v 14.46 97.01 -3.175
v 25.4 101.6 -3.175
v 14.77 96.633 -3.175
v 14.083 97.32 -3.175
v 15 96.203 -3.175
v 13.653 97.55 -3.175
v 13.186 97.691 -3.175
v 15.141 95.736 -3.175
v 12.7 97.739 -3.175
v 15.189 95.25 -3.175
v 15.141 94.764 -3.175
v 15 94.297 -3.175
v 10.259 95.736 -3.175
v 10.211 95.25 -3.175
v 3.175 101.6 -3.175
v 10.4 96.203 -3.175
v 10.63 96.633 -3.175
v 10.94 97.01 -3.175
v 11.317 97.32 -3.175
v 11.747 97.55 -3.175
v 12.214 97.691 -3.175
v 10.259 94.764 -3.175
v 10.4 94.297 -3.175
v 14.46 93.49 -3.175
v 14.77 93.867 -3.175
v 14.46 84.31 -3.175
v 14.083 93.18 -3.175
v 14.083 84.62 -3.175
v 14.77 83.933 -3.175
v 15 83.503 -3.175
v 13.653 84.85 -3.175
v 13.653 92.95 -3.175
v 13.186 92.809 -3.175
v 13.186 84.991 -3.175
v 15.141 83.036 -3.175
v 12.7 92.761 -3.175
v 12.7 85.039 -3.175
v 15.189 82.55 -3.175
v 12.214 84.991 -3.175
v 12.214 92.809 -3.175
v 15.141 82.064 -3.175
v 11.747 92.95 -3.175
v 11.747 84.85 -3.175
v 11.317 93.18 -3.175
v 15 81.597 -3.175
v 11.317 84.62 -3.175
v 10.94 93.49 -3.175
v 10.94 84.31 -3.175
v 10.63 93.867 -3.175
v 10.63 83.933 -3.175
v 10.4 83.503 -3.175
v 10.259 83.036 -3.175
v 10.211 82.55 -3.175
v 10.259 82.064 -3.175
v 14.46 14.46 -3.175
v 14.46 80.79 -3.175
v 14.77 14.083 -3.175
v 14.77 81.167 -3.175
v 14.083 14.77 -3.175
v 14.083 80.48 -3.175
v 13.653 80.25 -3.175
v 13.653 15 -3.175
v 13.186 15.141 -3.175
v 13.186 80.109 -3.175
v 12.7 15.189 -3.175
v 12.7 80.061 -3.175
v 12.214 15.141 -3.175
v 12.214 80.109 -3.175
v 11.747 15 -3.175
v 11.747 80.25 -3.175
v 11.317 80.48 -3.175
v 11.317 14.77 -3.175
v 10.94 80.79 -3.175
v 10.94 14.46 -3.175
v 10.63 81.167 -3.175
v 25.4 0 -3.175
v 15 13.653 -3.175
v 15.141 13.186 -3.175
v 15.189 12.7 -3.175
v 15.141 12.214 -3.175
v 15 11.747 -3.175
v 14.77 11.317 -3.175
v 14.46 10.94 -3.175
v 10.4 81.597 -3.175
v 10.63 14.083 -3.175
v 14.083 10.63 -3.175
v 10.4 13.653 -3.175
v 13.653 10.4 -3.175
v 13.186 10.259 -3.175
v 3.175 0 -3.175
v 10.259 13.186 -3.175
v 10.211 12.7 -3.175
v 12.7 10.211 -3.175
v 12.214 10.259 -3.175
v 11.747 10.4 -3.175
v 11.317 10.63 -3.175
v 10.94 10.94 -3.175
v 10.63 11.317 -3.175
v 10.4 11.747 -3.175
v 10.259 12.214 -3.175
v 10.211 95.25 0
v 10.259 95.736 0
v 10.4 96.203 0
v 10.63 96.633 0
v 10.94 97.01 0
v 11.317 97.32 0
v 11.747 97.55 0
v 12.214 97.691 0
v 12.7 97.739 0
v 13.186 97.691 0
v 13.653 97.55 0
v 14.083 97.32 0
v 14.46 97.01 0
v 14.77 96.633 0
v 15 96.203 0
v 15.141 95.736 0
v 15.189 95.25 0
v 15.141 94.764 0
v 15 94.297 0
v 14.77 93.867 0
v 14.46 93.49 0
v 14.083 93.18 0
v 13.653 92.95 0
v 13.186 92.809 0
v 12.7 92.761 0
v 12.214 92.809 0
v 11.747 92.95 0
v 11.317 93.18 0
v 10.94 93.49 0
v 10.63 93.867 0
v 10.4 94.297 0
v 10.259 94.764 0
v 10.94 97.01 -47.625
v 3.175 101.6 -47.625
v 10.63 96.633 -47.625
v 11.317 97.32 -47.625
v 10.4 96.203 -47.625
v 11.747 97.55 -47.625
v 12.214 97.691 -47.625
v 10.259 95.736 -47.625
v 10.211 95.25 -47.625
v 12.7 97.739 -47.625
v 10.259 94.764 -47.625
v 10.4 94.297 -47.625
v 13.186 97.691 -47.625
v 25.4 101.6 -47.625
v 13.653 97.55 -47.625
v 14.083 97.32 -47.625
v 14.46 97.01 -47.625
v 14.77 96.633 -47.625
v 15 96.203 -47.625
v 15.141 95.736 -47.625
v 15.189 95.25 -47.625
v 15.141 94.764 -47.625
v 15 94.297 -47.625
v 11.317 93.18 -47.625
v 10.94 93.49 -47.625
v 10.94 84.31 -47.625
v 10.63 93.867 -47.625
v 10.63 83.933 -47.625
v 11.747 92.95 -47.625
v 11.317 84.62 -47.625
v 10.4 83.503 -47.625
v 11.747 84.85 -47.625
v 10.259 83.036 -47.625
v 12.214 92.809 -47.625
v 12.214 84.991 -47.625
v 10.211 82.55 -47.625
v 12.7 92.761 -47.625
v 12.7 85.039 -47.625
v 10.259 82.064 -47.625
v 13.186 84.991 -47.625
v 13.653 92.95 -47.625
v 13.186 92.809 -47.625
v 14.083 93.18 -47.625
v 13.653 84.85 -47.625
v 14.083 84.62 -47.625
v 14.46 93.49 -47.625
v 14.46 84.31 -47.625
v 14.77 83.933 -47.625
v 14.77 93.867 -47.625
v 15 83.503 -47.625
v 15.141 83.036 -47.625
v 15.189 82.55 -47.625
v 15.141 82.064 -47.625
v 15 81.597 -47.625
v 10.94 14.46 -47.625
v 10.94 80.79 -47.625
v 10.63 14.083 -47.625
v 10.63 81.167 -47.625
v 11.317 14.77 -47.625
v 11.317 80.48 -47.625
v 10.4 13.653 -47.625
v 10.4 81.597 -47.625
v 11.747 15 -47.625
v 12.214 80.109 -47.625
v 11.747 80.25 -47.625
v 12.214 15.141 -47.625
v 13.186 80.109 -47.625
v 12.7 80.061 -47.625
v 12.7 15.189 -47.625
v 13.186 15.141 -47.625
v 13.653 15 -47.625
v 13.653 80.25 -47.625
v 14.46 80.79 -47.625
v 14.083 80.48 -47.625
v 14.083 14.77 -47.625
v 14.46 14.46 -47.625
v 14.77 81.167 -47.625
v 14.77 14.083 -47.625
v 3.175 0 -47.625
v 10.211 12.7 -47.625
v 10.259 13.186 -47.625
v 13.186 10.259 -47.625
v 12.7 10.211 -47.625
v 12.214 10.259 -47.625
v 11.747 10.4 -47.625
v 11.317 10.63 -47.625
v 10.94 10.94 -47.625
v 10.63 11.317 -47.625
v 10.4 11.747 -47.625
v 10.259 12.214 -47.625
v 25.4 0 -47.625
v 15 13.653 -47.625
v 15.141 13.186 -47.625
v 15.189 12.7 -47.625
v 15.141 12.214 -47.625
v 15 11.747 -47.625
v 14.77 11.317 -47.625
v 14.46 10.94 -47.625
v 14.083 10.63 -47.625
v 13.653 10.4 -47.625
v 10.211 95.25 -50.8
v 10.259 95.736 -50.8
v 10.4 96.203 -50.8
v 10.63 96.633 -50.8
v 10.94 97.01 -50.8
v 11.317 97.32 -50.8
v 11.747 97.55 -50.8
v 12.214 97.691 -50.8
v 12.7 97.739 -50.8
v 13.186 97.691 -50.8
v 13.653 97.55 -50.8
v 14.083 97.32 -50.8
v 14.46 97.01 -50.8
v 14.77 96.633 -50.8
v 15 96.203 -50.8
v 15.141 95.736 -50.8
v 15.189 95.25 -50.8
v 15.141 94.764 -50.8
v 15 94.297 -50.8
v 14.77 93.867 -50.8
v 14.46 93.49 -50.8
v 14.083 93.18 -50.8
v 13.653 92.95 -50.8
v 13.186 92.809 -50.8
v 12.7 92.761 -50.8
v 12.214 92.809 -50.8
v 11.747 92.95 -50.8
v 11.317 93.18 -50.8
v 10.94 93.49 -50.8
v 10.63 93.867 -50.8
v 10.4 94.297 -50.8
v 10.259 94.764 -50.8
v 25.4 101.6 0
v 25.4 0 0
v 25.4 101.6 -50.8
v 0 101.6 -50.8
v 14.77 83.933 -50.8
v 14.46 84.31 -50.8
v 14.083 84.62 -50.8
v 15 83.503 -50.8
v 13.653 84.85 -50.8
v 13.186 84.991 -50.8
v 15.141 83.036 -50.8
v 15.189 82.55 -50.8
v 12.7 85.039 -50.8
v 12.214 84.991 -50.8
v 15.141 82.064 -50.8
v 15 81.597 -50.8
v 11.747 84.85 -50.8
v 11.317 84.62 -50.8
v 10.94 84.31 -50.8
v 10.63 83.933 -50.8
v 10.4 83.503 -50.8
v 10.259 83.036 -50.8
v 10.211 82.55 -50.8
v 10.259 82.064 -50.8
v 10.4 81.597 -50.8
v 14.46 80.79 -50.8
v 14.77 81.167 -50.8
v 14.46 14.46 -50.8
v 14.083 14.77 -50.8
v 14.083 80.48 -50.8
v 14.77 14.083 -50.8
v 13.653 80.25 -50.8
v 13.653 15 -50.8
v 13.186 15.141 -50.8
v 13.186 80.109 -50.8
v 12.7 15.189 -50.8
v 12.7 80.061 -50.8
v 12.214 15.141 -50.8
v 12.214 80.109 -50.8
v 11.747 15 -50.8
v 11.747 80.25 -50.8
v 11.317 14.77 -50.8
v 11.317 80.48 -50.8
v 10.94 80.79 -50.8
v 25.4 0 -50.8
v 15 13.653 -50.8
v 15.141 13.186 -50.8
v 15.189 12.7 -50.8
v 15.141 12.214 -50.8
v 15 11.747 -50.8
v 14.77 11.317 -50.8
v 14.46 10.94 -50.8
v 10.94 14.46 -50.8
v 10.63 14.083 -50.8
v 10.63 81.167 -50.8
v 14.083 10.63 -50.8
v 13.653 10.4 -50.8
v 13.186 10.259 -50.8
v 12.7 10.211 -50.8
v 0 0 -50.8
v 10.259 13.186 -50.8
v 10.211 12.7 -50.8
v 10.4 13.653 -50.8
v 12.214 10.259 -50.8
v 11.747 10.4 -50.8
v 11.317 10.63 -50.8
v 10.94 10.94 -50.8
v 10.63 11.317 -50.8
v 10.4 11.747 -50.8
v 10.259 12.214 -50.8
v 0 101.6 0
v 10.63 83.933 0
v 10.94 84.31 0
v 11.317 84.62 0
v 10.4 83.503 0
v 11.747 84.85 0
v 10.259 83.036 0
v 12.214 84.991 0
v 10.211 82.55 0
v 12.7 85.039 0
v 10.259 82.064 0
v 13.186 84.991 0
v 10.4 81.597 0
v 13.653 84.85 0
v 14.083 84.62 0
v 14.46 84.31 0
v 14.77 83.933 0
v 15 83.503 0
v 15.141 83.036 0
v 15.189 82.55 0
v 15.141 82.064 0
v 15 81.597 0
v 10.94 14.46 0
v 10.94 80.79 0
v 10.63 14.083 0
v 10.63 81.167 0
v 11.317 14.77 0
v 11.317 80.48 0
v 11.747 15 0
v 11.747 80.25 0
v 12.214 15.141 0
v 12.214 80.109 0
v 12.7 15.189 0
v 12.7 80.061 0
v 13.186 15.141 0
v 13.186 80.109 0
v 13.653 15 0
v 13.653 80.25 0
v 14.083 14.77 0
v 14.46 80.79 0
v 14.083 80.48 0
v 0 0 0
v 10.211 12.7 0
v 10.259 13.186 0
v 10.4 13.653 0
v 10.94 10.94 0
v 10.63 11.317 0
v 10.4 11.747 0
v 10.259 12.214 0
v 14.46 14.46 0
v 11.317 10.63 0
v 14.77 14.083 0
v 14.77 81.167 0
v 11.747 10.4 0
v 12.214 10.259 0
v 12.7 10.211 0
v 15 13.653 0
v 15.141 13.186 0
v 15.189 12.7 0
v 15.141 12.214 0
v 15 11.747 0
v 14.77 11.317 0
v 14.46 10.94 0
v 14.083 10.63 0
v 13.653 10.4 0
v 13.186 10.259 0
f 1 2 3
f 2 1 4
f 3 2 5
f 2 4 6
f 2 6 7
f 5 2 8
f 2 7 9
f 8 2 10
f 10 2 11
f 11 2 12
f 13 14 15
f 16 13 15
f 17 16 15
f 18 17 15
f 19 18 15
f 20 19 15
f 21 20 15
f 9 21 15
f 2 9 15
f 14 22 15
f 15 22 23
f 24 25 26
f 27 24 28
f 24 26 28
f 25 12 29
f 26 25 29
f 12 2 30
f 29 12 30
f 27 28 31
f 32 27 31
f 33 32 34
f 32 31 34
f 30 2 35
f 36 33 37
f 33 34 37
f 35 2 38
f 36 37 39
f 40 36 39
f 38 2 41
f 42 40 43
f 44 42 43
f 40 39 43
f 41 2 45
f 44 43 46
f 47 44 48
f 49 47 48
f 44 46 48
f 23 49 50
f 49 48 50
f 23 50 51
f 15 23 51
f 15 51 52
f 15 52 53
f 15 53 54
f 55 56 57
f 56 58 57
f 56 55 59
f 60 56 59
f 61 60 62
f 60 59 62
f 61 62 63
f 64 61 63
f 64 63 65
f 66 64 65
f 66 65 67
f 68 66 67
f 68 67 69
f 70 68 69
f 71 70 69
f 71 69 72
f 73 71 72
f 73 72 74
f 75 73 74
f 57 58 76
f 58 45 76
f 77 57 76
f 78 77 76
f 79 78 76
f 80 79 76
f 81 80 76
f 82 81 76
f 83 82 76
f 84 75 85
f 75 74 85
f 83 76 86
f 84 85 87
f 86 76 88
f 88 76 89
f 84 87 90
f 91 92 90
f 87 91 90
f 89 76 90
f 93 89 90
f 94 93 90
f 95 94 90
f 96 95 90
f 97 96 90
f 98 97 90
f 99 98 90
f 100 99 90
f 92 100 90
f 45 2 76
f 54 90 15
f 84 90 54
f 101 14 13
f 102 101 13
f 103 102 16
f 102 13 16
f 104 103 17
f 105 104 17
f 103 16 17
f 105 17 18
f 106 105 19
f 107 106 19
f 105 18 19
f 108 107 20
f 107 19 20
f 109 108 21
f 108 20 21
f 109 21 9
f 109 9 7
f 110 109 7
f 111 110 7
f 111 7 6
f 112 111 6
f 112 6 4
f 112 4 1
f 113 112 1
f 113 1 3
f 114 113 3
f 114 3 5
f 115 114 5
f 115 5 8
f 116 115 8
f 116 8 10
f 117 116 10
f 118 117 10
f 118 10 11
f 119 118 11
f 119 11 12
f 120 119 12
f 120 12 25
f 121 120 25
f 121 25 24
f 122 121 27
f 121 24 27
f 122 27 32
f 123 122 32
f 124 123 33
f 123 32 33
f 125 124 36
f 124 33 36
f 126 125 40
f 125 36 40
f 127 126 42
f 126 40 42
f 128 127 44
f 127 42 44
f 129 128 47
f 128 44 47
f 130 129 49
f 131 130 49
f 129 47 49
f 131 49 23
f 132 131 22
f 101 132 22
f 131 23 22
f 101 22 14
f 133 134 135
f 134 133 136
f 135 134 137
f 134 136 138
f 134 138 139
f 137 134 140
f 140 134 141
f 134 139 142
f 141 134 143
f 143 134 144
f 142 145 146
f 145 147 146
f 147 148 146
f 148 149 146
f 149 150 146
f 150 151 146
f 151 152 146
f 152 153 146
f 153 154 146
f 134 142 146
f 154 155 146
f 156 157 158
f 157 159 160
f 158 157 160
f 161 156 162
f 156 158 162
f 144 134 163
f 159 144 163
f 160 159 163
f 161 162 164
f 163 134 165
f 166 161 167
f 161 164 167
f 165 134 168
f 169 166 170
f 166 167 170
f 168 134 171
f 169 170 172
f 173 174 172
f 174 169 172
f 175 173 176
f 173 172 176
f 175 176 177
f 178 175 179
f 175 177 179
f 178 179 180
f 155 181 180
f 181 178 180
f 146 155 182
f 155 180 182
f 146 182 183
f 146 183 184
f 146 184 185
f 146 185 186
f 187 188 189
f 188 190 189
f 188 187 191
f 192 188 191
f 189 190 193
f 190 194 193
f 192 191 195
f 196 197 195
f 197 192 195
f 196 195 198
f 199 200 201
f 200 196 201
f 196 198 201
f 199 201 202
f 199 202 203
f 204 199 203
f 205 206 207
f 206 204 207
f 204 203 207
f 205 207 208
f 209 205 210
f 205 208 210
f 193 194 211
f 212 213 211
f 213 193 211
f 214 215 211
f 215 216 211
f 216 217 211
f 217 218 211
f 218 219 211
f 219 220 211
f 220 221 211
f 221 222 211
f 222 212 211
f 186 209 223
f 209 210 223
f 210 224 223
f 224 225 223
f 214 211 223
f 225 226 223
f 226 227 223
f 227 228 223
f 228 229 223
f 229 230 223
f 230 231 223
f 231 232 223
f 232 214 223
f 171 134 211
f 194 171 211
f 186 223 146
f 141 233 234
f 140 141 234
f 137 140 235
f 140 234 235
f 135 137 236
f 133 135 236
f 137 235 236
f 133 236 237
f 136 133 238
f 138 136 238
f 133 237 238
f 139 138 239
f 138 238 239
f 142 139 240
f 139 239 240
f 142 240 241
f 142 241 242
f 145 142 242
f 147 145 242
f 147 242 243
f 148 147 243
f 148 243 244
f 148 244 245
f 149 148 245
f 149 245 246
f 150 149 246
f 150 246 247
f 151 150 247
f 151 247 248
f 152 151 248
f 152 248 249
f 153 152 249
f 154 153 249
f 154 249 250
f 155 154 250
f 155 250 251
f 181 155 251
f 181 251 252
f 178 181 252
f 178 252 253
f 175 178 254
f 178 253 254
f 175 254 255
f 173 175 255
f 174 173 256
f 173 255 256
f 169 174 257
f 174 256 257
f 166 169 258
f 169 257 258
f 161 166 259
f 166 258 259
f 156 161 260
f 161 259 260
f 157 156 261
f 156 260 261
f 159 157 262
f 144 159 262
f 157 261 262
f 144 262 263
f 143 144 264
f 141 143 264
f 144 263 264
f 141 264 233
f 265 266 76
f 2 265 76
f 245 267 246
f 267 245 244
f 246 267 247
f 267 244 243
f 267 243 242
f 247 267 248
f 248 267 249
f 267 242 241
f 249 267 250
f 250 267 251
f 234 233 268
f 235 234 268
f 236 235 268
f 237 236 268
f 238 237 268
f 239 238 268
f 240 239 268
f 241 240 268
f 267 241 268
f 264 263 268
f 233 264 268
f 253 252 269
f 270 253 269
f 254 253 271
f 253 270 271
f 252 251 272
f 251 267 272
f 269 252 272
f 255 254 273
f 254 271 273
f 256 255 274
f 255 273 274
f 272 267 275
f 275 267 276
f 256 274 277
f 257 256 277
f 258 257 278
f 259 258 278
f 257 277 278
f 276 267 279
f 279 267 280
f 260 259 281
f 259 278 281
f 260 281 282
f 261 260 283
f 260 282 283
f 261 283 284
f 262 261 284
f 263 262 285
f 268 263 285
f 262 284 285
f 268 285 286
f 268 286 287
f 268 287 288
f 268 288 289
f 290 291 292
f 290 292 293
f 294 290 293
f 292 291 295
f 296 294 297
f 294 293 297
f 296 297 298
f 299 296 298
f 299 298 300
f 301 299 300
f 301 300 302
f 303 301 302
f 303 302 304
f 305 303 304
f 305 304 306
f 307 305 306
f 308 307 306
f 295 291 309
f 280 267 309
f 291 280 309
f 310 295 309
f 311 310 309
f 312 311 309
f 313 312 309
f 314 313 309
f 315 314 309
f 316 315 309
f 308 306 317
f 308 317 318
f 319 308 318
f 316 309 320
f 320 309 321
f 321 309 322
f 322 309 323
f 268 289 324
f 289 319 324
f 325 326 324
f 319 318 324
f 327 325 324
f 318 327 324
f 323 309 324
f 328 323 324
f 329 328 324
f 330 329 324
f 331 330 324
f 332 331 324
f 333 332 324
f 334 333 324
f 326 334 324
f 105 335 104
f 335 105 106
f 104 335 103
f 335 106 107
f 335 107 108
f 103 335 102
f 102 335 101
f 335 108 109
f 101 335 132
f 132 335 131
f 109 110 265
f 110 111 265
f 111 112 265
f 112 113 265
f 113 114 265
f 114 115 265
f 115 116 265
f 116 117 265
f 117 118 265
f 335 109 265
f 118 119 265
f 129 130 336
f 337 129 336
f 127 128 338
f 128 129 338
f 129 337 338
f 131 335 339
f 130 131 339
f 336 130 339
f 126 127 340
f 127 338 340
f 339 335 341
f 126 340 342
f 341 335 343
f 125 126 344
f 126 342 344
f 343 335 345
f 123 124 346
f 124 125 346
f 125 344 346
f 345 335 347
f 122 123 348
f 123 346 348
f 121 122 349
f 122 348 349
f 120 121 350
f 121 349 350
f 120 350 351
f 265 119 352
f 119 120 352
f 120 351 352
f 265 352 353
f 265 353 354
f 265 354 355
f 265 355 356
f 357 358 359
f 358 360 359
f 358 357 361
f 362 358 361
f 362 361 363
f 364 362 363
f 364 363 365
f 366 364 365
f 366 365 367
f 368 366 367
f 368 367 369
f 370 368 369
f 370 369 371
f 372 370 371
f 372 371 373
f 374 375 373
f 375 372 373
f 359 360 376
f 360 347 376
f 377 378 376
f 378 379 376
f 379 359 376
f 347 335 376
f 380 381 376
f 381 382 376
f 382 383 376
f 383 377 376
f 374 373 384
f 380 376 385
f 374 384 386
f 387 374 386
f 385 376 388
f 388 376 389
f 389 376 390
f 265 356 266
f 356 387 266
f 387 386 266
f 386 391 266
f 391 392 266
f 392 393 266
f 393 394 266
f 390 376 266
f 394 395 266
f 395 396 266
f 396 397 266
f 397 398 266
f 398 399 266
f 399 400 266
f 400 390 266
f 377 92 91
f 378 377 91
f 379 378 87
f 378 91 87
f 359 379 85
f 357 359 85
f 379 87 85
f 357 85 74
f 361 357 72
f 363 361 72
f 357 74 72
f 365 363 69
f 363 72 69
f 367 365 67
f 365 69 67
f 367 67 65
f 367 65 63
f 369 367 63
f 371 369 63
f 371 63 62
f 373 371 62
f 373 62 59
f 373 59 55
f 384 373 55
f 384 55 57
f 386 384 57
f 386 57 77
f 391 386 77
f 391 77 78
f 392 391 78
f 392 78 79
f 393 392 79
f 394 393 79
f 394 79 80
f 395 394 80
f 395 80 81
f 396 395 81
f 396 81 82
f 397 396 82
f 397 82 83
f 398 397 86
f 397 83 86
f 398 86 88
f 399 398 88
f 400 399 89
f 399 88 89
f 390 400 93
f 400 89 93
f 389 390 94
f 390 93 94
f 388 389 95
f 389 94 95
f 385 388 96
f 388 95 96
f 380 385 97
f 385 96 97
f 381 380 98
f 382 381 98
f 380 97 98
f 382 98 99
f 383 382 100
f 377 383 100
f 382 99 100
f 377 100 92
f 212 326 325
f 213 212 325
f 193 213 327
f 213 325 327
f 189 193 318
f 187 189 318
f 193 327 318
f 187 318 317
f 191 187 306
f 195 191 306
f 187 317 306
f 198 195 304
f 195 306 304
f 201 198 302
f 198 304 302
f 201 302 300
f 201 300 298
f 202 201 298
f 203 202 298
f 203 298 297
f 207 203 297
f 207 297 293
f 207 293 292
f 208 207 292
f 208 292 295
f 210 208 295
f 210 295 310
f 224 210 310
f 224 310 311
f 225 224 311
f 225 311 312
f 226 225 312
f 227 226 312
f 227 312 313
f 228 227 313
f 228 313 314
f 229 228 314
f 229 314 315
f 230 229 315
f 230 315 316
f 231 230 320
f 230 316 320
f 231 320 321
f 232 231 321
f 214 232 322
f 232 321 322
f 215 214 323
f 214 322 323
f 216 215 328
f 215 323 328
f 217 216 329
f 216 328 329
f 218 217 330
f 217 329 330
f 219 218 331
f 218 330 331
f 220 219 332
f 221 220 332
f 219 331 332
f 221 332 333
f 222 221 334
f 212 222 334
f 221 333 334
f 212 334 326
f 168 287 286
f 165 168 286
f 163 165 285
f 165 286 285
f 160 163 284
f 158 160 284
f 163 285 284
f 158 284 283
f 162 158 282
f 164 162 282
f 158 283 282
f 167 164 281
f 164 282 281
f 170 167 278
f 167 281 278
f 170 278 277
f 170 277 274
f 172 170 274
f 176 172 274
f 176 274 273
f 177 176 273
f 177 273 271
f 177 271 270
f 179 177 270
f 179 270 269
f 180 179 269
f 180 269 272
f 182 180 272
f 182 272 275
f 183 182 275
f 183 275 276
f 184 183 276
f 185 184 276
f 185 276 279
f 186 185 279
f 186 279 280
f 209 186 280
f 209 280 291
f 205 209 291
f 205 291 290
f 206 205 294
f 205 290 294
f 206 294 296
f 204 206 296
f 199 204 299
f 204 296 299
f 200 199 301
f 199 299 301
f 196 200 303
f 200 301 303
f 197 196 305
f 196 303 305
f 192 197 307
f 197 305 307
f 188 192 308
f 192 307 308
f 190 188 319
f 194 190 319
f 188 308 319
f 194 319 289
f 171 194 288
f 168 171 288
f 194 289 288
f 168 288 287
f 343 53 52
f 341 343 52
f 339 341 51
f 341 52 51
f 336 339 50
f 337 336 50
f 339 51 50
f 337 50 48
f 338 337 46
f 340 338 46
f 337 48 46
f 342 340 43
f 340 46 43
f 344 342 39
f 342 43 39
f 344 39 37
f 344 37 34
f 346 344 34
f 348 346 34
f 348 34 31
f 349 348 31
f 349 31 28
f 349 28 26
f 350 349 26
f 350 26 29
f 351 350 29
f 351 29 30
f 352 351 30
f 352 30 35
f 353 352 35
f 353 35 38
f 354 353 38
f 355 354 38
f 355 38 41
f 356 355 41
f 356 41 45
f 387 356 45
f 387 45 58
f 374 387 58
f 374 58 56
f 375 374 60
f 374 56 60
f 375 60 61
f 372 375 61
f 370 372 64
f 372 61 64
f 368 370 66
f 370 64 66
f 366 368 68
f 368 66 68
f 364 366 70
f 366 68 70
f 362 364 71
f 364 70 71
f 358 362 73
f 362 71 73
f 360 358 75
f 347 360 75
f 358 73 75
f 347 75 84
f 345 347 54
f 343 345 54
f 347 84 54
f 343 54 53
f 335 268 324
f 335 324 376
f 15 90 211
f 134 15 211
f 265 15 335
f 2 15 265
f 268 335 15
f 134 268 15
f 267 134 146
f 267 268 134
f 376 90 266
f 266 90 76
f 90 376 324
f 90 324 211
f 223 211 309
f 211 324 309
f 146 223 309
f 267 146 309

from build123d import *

# Parameters (mm, degrees)
BOSS_EXTRUDE1_DEPTH = 101.6
SKETCH2_R           = 2.4892
CUT_EXTRUDE1_DEPTH  = 51.8


with BuildPart() as part:
    # Sketch1 → Boss-Extrude1 (new body)
    with BuildSketch(Plane(origin=(0, 0, 0), x_dir=(1, 0, 0), z_dir=(0, 1, 0))):
        Polygon((0, 0), (25.4, 0), (25.4, 3.175), (3.175, 3.175), (3.175, 47.625), (25.4, 47.625), (25.4, 50.8), (0, 50.8), align=None)
    extrude(amount=BOSS_EXTRUDE1_DEPTH)

    # Sketch2 → Cut-Extrude1 (cut, through all)
    with BuildSketch(Plane(origin=(0, 0, -50.8), x_dir=(-1, 0, 0), z_dir=(0, 0, -1))):
        with Locations((-12.7, 12.7)):
            Circle(SKETCH2_R)
        with Locations((-12.7, 95.25)):
            Circle(SKETCH2_R)
        with Locations((-12.7, 82.55)):
            Circle(SKETCH2_R)
    extrude(amount=-CUT_EXTRUDE1_DEPTH, mode=Mode.SUBTRACT)


solid = part.part
